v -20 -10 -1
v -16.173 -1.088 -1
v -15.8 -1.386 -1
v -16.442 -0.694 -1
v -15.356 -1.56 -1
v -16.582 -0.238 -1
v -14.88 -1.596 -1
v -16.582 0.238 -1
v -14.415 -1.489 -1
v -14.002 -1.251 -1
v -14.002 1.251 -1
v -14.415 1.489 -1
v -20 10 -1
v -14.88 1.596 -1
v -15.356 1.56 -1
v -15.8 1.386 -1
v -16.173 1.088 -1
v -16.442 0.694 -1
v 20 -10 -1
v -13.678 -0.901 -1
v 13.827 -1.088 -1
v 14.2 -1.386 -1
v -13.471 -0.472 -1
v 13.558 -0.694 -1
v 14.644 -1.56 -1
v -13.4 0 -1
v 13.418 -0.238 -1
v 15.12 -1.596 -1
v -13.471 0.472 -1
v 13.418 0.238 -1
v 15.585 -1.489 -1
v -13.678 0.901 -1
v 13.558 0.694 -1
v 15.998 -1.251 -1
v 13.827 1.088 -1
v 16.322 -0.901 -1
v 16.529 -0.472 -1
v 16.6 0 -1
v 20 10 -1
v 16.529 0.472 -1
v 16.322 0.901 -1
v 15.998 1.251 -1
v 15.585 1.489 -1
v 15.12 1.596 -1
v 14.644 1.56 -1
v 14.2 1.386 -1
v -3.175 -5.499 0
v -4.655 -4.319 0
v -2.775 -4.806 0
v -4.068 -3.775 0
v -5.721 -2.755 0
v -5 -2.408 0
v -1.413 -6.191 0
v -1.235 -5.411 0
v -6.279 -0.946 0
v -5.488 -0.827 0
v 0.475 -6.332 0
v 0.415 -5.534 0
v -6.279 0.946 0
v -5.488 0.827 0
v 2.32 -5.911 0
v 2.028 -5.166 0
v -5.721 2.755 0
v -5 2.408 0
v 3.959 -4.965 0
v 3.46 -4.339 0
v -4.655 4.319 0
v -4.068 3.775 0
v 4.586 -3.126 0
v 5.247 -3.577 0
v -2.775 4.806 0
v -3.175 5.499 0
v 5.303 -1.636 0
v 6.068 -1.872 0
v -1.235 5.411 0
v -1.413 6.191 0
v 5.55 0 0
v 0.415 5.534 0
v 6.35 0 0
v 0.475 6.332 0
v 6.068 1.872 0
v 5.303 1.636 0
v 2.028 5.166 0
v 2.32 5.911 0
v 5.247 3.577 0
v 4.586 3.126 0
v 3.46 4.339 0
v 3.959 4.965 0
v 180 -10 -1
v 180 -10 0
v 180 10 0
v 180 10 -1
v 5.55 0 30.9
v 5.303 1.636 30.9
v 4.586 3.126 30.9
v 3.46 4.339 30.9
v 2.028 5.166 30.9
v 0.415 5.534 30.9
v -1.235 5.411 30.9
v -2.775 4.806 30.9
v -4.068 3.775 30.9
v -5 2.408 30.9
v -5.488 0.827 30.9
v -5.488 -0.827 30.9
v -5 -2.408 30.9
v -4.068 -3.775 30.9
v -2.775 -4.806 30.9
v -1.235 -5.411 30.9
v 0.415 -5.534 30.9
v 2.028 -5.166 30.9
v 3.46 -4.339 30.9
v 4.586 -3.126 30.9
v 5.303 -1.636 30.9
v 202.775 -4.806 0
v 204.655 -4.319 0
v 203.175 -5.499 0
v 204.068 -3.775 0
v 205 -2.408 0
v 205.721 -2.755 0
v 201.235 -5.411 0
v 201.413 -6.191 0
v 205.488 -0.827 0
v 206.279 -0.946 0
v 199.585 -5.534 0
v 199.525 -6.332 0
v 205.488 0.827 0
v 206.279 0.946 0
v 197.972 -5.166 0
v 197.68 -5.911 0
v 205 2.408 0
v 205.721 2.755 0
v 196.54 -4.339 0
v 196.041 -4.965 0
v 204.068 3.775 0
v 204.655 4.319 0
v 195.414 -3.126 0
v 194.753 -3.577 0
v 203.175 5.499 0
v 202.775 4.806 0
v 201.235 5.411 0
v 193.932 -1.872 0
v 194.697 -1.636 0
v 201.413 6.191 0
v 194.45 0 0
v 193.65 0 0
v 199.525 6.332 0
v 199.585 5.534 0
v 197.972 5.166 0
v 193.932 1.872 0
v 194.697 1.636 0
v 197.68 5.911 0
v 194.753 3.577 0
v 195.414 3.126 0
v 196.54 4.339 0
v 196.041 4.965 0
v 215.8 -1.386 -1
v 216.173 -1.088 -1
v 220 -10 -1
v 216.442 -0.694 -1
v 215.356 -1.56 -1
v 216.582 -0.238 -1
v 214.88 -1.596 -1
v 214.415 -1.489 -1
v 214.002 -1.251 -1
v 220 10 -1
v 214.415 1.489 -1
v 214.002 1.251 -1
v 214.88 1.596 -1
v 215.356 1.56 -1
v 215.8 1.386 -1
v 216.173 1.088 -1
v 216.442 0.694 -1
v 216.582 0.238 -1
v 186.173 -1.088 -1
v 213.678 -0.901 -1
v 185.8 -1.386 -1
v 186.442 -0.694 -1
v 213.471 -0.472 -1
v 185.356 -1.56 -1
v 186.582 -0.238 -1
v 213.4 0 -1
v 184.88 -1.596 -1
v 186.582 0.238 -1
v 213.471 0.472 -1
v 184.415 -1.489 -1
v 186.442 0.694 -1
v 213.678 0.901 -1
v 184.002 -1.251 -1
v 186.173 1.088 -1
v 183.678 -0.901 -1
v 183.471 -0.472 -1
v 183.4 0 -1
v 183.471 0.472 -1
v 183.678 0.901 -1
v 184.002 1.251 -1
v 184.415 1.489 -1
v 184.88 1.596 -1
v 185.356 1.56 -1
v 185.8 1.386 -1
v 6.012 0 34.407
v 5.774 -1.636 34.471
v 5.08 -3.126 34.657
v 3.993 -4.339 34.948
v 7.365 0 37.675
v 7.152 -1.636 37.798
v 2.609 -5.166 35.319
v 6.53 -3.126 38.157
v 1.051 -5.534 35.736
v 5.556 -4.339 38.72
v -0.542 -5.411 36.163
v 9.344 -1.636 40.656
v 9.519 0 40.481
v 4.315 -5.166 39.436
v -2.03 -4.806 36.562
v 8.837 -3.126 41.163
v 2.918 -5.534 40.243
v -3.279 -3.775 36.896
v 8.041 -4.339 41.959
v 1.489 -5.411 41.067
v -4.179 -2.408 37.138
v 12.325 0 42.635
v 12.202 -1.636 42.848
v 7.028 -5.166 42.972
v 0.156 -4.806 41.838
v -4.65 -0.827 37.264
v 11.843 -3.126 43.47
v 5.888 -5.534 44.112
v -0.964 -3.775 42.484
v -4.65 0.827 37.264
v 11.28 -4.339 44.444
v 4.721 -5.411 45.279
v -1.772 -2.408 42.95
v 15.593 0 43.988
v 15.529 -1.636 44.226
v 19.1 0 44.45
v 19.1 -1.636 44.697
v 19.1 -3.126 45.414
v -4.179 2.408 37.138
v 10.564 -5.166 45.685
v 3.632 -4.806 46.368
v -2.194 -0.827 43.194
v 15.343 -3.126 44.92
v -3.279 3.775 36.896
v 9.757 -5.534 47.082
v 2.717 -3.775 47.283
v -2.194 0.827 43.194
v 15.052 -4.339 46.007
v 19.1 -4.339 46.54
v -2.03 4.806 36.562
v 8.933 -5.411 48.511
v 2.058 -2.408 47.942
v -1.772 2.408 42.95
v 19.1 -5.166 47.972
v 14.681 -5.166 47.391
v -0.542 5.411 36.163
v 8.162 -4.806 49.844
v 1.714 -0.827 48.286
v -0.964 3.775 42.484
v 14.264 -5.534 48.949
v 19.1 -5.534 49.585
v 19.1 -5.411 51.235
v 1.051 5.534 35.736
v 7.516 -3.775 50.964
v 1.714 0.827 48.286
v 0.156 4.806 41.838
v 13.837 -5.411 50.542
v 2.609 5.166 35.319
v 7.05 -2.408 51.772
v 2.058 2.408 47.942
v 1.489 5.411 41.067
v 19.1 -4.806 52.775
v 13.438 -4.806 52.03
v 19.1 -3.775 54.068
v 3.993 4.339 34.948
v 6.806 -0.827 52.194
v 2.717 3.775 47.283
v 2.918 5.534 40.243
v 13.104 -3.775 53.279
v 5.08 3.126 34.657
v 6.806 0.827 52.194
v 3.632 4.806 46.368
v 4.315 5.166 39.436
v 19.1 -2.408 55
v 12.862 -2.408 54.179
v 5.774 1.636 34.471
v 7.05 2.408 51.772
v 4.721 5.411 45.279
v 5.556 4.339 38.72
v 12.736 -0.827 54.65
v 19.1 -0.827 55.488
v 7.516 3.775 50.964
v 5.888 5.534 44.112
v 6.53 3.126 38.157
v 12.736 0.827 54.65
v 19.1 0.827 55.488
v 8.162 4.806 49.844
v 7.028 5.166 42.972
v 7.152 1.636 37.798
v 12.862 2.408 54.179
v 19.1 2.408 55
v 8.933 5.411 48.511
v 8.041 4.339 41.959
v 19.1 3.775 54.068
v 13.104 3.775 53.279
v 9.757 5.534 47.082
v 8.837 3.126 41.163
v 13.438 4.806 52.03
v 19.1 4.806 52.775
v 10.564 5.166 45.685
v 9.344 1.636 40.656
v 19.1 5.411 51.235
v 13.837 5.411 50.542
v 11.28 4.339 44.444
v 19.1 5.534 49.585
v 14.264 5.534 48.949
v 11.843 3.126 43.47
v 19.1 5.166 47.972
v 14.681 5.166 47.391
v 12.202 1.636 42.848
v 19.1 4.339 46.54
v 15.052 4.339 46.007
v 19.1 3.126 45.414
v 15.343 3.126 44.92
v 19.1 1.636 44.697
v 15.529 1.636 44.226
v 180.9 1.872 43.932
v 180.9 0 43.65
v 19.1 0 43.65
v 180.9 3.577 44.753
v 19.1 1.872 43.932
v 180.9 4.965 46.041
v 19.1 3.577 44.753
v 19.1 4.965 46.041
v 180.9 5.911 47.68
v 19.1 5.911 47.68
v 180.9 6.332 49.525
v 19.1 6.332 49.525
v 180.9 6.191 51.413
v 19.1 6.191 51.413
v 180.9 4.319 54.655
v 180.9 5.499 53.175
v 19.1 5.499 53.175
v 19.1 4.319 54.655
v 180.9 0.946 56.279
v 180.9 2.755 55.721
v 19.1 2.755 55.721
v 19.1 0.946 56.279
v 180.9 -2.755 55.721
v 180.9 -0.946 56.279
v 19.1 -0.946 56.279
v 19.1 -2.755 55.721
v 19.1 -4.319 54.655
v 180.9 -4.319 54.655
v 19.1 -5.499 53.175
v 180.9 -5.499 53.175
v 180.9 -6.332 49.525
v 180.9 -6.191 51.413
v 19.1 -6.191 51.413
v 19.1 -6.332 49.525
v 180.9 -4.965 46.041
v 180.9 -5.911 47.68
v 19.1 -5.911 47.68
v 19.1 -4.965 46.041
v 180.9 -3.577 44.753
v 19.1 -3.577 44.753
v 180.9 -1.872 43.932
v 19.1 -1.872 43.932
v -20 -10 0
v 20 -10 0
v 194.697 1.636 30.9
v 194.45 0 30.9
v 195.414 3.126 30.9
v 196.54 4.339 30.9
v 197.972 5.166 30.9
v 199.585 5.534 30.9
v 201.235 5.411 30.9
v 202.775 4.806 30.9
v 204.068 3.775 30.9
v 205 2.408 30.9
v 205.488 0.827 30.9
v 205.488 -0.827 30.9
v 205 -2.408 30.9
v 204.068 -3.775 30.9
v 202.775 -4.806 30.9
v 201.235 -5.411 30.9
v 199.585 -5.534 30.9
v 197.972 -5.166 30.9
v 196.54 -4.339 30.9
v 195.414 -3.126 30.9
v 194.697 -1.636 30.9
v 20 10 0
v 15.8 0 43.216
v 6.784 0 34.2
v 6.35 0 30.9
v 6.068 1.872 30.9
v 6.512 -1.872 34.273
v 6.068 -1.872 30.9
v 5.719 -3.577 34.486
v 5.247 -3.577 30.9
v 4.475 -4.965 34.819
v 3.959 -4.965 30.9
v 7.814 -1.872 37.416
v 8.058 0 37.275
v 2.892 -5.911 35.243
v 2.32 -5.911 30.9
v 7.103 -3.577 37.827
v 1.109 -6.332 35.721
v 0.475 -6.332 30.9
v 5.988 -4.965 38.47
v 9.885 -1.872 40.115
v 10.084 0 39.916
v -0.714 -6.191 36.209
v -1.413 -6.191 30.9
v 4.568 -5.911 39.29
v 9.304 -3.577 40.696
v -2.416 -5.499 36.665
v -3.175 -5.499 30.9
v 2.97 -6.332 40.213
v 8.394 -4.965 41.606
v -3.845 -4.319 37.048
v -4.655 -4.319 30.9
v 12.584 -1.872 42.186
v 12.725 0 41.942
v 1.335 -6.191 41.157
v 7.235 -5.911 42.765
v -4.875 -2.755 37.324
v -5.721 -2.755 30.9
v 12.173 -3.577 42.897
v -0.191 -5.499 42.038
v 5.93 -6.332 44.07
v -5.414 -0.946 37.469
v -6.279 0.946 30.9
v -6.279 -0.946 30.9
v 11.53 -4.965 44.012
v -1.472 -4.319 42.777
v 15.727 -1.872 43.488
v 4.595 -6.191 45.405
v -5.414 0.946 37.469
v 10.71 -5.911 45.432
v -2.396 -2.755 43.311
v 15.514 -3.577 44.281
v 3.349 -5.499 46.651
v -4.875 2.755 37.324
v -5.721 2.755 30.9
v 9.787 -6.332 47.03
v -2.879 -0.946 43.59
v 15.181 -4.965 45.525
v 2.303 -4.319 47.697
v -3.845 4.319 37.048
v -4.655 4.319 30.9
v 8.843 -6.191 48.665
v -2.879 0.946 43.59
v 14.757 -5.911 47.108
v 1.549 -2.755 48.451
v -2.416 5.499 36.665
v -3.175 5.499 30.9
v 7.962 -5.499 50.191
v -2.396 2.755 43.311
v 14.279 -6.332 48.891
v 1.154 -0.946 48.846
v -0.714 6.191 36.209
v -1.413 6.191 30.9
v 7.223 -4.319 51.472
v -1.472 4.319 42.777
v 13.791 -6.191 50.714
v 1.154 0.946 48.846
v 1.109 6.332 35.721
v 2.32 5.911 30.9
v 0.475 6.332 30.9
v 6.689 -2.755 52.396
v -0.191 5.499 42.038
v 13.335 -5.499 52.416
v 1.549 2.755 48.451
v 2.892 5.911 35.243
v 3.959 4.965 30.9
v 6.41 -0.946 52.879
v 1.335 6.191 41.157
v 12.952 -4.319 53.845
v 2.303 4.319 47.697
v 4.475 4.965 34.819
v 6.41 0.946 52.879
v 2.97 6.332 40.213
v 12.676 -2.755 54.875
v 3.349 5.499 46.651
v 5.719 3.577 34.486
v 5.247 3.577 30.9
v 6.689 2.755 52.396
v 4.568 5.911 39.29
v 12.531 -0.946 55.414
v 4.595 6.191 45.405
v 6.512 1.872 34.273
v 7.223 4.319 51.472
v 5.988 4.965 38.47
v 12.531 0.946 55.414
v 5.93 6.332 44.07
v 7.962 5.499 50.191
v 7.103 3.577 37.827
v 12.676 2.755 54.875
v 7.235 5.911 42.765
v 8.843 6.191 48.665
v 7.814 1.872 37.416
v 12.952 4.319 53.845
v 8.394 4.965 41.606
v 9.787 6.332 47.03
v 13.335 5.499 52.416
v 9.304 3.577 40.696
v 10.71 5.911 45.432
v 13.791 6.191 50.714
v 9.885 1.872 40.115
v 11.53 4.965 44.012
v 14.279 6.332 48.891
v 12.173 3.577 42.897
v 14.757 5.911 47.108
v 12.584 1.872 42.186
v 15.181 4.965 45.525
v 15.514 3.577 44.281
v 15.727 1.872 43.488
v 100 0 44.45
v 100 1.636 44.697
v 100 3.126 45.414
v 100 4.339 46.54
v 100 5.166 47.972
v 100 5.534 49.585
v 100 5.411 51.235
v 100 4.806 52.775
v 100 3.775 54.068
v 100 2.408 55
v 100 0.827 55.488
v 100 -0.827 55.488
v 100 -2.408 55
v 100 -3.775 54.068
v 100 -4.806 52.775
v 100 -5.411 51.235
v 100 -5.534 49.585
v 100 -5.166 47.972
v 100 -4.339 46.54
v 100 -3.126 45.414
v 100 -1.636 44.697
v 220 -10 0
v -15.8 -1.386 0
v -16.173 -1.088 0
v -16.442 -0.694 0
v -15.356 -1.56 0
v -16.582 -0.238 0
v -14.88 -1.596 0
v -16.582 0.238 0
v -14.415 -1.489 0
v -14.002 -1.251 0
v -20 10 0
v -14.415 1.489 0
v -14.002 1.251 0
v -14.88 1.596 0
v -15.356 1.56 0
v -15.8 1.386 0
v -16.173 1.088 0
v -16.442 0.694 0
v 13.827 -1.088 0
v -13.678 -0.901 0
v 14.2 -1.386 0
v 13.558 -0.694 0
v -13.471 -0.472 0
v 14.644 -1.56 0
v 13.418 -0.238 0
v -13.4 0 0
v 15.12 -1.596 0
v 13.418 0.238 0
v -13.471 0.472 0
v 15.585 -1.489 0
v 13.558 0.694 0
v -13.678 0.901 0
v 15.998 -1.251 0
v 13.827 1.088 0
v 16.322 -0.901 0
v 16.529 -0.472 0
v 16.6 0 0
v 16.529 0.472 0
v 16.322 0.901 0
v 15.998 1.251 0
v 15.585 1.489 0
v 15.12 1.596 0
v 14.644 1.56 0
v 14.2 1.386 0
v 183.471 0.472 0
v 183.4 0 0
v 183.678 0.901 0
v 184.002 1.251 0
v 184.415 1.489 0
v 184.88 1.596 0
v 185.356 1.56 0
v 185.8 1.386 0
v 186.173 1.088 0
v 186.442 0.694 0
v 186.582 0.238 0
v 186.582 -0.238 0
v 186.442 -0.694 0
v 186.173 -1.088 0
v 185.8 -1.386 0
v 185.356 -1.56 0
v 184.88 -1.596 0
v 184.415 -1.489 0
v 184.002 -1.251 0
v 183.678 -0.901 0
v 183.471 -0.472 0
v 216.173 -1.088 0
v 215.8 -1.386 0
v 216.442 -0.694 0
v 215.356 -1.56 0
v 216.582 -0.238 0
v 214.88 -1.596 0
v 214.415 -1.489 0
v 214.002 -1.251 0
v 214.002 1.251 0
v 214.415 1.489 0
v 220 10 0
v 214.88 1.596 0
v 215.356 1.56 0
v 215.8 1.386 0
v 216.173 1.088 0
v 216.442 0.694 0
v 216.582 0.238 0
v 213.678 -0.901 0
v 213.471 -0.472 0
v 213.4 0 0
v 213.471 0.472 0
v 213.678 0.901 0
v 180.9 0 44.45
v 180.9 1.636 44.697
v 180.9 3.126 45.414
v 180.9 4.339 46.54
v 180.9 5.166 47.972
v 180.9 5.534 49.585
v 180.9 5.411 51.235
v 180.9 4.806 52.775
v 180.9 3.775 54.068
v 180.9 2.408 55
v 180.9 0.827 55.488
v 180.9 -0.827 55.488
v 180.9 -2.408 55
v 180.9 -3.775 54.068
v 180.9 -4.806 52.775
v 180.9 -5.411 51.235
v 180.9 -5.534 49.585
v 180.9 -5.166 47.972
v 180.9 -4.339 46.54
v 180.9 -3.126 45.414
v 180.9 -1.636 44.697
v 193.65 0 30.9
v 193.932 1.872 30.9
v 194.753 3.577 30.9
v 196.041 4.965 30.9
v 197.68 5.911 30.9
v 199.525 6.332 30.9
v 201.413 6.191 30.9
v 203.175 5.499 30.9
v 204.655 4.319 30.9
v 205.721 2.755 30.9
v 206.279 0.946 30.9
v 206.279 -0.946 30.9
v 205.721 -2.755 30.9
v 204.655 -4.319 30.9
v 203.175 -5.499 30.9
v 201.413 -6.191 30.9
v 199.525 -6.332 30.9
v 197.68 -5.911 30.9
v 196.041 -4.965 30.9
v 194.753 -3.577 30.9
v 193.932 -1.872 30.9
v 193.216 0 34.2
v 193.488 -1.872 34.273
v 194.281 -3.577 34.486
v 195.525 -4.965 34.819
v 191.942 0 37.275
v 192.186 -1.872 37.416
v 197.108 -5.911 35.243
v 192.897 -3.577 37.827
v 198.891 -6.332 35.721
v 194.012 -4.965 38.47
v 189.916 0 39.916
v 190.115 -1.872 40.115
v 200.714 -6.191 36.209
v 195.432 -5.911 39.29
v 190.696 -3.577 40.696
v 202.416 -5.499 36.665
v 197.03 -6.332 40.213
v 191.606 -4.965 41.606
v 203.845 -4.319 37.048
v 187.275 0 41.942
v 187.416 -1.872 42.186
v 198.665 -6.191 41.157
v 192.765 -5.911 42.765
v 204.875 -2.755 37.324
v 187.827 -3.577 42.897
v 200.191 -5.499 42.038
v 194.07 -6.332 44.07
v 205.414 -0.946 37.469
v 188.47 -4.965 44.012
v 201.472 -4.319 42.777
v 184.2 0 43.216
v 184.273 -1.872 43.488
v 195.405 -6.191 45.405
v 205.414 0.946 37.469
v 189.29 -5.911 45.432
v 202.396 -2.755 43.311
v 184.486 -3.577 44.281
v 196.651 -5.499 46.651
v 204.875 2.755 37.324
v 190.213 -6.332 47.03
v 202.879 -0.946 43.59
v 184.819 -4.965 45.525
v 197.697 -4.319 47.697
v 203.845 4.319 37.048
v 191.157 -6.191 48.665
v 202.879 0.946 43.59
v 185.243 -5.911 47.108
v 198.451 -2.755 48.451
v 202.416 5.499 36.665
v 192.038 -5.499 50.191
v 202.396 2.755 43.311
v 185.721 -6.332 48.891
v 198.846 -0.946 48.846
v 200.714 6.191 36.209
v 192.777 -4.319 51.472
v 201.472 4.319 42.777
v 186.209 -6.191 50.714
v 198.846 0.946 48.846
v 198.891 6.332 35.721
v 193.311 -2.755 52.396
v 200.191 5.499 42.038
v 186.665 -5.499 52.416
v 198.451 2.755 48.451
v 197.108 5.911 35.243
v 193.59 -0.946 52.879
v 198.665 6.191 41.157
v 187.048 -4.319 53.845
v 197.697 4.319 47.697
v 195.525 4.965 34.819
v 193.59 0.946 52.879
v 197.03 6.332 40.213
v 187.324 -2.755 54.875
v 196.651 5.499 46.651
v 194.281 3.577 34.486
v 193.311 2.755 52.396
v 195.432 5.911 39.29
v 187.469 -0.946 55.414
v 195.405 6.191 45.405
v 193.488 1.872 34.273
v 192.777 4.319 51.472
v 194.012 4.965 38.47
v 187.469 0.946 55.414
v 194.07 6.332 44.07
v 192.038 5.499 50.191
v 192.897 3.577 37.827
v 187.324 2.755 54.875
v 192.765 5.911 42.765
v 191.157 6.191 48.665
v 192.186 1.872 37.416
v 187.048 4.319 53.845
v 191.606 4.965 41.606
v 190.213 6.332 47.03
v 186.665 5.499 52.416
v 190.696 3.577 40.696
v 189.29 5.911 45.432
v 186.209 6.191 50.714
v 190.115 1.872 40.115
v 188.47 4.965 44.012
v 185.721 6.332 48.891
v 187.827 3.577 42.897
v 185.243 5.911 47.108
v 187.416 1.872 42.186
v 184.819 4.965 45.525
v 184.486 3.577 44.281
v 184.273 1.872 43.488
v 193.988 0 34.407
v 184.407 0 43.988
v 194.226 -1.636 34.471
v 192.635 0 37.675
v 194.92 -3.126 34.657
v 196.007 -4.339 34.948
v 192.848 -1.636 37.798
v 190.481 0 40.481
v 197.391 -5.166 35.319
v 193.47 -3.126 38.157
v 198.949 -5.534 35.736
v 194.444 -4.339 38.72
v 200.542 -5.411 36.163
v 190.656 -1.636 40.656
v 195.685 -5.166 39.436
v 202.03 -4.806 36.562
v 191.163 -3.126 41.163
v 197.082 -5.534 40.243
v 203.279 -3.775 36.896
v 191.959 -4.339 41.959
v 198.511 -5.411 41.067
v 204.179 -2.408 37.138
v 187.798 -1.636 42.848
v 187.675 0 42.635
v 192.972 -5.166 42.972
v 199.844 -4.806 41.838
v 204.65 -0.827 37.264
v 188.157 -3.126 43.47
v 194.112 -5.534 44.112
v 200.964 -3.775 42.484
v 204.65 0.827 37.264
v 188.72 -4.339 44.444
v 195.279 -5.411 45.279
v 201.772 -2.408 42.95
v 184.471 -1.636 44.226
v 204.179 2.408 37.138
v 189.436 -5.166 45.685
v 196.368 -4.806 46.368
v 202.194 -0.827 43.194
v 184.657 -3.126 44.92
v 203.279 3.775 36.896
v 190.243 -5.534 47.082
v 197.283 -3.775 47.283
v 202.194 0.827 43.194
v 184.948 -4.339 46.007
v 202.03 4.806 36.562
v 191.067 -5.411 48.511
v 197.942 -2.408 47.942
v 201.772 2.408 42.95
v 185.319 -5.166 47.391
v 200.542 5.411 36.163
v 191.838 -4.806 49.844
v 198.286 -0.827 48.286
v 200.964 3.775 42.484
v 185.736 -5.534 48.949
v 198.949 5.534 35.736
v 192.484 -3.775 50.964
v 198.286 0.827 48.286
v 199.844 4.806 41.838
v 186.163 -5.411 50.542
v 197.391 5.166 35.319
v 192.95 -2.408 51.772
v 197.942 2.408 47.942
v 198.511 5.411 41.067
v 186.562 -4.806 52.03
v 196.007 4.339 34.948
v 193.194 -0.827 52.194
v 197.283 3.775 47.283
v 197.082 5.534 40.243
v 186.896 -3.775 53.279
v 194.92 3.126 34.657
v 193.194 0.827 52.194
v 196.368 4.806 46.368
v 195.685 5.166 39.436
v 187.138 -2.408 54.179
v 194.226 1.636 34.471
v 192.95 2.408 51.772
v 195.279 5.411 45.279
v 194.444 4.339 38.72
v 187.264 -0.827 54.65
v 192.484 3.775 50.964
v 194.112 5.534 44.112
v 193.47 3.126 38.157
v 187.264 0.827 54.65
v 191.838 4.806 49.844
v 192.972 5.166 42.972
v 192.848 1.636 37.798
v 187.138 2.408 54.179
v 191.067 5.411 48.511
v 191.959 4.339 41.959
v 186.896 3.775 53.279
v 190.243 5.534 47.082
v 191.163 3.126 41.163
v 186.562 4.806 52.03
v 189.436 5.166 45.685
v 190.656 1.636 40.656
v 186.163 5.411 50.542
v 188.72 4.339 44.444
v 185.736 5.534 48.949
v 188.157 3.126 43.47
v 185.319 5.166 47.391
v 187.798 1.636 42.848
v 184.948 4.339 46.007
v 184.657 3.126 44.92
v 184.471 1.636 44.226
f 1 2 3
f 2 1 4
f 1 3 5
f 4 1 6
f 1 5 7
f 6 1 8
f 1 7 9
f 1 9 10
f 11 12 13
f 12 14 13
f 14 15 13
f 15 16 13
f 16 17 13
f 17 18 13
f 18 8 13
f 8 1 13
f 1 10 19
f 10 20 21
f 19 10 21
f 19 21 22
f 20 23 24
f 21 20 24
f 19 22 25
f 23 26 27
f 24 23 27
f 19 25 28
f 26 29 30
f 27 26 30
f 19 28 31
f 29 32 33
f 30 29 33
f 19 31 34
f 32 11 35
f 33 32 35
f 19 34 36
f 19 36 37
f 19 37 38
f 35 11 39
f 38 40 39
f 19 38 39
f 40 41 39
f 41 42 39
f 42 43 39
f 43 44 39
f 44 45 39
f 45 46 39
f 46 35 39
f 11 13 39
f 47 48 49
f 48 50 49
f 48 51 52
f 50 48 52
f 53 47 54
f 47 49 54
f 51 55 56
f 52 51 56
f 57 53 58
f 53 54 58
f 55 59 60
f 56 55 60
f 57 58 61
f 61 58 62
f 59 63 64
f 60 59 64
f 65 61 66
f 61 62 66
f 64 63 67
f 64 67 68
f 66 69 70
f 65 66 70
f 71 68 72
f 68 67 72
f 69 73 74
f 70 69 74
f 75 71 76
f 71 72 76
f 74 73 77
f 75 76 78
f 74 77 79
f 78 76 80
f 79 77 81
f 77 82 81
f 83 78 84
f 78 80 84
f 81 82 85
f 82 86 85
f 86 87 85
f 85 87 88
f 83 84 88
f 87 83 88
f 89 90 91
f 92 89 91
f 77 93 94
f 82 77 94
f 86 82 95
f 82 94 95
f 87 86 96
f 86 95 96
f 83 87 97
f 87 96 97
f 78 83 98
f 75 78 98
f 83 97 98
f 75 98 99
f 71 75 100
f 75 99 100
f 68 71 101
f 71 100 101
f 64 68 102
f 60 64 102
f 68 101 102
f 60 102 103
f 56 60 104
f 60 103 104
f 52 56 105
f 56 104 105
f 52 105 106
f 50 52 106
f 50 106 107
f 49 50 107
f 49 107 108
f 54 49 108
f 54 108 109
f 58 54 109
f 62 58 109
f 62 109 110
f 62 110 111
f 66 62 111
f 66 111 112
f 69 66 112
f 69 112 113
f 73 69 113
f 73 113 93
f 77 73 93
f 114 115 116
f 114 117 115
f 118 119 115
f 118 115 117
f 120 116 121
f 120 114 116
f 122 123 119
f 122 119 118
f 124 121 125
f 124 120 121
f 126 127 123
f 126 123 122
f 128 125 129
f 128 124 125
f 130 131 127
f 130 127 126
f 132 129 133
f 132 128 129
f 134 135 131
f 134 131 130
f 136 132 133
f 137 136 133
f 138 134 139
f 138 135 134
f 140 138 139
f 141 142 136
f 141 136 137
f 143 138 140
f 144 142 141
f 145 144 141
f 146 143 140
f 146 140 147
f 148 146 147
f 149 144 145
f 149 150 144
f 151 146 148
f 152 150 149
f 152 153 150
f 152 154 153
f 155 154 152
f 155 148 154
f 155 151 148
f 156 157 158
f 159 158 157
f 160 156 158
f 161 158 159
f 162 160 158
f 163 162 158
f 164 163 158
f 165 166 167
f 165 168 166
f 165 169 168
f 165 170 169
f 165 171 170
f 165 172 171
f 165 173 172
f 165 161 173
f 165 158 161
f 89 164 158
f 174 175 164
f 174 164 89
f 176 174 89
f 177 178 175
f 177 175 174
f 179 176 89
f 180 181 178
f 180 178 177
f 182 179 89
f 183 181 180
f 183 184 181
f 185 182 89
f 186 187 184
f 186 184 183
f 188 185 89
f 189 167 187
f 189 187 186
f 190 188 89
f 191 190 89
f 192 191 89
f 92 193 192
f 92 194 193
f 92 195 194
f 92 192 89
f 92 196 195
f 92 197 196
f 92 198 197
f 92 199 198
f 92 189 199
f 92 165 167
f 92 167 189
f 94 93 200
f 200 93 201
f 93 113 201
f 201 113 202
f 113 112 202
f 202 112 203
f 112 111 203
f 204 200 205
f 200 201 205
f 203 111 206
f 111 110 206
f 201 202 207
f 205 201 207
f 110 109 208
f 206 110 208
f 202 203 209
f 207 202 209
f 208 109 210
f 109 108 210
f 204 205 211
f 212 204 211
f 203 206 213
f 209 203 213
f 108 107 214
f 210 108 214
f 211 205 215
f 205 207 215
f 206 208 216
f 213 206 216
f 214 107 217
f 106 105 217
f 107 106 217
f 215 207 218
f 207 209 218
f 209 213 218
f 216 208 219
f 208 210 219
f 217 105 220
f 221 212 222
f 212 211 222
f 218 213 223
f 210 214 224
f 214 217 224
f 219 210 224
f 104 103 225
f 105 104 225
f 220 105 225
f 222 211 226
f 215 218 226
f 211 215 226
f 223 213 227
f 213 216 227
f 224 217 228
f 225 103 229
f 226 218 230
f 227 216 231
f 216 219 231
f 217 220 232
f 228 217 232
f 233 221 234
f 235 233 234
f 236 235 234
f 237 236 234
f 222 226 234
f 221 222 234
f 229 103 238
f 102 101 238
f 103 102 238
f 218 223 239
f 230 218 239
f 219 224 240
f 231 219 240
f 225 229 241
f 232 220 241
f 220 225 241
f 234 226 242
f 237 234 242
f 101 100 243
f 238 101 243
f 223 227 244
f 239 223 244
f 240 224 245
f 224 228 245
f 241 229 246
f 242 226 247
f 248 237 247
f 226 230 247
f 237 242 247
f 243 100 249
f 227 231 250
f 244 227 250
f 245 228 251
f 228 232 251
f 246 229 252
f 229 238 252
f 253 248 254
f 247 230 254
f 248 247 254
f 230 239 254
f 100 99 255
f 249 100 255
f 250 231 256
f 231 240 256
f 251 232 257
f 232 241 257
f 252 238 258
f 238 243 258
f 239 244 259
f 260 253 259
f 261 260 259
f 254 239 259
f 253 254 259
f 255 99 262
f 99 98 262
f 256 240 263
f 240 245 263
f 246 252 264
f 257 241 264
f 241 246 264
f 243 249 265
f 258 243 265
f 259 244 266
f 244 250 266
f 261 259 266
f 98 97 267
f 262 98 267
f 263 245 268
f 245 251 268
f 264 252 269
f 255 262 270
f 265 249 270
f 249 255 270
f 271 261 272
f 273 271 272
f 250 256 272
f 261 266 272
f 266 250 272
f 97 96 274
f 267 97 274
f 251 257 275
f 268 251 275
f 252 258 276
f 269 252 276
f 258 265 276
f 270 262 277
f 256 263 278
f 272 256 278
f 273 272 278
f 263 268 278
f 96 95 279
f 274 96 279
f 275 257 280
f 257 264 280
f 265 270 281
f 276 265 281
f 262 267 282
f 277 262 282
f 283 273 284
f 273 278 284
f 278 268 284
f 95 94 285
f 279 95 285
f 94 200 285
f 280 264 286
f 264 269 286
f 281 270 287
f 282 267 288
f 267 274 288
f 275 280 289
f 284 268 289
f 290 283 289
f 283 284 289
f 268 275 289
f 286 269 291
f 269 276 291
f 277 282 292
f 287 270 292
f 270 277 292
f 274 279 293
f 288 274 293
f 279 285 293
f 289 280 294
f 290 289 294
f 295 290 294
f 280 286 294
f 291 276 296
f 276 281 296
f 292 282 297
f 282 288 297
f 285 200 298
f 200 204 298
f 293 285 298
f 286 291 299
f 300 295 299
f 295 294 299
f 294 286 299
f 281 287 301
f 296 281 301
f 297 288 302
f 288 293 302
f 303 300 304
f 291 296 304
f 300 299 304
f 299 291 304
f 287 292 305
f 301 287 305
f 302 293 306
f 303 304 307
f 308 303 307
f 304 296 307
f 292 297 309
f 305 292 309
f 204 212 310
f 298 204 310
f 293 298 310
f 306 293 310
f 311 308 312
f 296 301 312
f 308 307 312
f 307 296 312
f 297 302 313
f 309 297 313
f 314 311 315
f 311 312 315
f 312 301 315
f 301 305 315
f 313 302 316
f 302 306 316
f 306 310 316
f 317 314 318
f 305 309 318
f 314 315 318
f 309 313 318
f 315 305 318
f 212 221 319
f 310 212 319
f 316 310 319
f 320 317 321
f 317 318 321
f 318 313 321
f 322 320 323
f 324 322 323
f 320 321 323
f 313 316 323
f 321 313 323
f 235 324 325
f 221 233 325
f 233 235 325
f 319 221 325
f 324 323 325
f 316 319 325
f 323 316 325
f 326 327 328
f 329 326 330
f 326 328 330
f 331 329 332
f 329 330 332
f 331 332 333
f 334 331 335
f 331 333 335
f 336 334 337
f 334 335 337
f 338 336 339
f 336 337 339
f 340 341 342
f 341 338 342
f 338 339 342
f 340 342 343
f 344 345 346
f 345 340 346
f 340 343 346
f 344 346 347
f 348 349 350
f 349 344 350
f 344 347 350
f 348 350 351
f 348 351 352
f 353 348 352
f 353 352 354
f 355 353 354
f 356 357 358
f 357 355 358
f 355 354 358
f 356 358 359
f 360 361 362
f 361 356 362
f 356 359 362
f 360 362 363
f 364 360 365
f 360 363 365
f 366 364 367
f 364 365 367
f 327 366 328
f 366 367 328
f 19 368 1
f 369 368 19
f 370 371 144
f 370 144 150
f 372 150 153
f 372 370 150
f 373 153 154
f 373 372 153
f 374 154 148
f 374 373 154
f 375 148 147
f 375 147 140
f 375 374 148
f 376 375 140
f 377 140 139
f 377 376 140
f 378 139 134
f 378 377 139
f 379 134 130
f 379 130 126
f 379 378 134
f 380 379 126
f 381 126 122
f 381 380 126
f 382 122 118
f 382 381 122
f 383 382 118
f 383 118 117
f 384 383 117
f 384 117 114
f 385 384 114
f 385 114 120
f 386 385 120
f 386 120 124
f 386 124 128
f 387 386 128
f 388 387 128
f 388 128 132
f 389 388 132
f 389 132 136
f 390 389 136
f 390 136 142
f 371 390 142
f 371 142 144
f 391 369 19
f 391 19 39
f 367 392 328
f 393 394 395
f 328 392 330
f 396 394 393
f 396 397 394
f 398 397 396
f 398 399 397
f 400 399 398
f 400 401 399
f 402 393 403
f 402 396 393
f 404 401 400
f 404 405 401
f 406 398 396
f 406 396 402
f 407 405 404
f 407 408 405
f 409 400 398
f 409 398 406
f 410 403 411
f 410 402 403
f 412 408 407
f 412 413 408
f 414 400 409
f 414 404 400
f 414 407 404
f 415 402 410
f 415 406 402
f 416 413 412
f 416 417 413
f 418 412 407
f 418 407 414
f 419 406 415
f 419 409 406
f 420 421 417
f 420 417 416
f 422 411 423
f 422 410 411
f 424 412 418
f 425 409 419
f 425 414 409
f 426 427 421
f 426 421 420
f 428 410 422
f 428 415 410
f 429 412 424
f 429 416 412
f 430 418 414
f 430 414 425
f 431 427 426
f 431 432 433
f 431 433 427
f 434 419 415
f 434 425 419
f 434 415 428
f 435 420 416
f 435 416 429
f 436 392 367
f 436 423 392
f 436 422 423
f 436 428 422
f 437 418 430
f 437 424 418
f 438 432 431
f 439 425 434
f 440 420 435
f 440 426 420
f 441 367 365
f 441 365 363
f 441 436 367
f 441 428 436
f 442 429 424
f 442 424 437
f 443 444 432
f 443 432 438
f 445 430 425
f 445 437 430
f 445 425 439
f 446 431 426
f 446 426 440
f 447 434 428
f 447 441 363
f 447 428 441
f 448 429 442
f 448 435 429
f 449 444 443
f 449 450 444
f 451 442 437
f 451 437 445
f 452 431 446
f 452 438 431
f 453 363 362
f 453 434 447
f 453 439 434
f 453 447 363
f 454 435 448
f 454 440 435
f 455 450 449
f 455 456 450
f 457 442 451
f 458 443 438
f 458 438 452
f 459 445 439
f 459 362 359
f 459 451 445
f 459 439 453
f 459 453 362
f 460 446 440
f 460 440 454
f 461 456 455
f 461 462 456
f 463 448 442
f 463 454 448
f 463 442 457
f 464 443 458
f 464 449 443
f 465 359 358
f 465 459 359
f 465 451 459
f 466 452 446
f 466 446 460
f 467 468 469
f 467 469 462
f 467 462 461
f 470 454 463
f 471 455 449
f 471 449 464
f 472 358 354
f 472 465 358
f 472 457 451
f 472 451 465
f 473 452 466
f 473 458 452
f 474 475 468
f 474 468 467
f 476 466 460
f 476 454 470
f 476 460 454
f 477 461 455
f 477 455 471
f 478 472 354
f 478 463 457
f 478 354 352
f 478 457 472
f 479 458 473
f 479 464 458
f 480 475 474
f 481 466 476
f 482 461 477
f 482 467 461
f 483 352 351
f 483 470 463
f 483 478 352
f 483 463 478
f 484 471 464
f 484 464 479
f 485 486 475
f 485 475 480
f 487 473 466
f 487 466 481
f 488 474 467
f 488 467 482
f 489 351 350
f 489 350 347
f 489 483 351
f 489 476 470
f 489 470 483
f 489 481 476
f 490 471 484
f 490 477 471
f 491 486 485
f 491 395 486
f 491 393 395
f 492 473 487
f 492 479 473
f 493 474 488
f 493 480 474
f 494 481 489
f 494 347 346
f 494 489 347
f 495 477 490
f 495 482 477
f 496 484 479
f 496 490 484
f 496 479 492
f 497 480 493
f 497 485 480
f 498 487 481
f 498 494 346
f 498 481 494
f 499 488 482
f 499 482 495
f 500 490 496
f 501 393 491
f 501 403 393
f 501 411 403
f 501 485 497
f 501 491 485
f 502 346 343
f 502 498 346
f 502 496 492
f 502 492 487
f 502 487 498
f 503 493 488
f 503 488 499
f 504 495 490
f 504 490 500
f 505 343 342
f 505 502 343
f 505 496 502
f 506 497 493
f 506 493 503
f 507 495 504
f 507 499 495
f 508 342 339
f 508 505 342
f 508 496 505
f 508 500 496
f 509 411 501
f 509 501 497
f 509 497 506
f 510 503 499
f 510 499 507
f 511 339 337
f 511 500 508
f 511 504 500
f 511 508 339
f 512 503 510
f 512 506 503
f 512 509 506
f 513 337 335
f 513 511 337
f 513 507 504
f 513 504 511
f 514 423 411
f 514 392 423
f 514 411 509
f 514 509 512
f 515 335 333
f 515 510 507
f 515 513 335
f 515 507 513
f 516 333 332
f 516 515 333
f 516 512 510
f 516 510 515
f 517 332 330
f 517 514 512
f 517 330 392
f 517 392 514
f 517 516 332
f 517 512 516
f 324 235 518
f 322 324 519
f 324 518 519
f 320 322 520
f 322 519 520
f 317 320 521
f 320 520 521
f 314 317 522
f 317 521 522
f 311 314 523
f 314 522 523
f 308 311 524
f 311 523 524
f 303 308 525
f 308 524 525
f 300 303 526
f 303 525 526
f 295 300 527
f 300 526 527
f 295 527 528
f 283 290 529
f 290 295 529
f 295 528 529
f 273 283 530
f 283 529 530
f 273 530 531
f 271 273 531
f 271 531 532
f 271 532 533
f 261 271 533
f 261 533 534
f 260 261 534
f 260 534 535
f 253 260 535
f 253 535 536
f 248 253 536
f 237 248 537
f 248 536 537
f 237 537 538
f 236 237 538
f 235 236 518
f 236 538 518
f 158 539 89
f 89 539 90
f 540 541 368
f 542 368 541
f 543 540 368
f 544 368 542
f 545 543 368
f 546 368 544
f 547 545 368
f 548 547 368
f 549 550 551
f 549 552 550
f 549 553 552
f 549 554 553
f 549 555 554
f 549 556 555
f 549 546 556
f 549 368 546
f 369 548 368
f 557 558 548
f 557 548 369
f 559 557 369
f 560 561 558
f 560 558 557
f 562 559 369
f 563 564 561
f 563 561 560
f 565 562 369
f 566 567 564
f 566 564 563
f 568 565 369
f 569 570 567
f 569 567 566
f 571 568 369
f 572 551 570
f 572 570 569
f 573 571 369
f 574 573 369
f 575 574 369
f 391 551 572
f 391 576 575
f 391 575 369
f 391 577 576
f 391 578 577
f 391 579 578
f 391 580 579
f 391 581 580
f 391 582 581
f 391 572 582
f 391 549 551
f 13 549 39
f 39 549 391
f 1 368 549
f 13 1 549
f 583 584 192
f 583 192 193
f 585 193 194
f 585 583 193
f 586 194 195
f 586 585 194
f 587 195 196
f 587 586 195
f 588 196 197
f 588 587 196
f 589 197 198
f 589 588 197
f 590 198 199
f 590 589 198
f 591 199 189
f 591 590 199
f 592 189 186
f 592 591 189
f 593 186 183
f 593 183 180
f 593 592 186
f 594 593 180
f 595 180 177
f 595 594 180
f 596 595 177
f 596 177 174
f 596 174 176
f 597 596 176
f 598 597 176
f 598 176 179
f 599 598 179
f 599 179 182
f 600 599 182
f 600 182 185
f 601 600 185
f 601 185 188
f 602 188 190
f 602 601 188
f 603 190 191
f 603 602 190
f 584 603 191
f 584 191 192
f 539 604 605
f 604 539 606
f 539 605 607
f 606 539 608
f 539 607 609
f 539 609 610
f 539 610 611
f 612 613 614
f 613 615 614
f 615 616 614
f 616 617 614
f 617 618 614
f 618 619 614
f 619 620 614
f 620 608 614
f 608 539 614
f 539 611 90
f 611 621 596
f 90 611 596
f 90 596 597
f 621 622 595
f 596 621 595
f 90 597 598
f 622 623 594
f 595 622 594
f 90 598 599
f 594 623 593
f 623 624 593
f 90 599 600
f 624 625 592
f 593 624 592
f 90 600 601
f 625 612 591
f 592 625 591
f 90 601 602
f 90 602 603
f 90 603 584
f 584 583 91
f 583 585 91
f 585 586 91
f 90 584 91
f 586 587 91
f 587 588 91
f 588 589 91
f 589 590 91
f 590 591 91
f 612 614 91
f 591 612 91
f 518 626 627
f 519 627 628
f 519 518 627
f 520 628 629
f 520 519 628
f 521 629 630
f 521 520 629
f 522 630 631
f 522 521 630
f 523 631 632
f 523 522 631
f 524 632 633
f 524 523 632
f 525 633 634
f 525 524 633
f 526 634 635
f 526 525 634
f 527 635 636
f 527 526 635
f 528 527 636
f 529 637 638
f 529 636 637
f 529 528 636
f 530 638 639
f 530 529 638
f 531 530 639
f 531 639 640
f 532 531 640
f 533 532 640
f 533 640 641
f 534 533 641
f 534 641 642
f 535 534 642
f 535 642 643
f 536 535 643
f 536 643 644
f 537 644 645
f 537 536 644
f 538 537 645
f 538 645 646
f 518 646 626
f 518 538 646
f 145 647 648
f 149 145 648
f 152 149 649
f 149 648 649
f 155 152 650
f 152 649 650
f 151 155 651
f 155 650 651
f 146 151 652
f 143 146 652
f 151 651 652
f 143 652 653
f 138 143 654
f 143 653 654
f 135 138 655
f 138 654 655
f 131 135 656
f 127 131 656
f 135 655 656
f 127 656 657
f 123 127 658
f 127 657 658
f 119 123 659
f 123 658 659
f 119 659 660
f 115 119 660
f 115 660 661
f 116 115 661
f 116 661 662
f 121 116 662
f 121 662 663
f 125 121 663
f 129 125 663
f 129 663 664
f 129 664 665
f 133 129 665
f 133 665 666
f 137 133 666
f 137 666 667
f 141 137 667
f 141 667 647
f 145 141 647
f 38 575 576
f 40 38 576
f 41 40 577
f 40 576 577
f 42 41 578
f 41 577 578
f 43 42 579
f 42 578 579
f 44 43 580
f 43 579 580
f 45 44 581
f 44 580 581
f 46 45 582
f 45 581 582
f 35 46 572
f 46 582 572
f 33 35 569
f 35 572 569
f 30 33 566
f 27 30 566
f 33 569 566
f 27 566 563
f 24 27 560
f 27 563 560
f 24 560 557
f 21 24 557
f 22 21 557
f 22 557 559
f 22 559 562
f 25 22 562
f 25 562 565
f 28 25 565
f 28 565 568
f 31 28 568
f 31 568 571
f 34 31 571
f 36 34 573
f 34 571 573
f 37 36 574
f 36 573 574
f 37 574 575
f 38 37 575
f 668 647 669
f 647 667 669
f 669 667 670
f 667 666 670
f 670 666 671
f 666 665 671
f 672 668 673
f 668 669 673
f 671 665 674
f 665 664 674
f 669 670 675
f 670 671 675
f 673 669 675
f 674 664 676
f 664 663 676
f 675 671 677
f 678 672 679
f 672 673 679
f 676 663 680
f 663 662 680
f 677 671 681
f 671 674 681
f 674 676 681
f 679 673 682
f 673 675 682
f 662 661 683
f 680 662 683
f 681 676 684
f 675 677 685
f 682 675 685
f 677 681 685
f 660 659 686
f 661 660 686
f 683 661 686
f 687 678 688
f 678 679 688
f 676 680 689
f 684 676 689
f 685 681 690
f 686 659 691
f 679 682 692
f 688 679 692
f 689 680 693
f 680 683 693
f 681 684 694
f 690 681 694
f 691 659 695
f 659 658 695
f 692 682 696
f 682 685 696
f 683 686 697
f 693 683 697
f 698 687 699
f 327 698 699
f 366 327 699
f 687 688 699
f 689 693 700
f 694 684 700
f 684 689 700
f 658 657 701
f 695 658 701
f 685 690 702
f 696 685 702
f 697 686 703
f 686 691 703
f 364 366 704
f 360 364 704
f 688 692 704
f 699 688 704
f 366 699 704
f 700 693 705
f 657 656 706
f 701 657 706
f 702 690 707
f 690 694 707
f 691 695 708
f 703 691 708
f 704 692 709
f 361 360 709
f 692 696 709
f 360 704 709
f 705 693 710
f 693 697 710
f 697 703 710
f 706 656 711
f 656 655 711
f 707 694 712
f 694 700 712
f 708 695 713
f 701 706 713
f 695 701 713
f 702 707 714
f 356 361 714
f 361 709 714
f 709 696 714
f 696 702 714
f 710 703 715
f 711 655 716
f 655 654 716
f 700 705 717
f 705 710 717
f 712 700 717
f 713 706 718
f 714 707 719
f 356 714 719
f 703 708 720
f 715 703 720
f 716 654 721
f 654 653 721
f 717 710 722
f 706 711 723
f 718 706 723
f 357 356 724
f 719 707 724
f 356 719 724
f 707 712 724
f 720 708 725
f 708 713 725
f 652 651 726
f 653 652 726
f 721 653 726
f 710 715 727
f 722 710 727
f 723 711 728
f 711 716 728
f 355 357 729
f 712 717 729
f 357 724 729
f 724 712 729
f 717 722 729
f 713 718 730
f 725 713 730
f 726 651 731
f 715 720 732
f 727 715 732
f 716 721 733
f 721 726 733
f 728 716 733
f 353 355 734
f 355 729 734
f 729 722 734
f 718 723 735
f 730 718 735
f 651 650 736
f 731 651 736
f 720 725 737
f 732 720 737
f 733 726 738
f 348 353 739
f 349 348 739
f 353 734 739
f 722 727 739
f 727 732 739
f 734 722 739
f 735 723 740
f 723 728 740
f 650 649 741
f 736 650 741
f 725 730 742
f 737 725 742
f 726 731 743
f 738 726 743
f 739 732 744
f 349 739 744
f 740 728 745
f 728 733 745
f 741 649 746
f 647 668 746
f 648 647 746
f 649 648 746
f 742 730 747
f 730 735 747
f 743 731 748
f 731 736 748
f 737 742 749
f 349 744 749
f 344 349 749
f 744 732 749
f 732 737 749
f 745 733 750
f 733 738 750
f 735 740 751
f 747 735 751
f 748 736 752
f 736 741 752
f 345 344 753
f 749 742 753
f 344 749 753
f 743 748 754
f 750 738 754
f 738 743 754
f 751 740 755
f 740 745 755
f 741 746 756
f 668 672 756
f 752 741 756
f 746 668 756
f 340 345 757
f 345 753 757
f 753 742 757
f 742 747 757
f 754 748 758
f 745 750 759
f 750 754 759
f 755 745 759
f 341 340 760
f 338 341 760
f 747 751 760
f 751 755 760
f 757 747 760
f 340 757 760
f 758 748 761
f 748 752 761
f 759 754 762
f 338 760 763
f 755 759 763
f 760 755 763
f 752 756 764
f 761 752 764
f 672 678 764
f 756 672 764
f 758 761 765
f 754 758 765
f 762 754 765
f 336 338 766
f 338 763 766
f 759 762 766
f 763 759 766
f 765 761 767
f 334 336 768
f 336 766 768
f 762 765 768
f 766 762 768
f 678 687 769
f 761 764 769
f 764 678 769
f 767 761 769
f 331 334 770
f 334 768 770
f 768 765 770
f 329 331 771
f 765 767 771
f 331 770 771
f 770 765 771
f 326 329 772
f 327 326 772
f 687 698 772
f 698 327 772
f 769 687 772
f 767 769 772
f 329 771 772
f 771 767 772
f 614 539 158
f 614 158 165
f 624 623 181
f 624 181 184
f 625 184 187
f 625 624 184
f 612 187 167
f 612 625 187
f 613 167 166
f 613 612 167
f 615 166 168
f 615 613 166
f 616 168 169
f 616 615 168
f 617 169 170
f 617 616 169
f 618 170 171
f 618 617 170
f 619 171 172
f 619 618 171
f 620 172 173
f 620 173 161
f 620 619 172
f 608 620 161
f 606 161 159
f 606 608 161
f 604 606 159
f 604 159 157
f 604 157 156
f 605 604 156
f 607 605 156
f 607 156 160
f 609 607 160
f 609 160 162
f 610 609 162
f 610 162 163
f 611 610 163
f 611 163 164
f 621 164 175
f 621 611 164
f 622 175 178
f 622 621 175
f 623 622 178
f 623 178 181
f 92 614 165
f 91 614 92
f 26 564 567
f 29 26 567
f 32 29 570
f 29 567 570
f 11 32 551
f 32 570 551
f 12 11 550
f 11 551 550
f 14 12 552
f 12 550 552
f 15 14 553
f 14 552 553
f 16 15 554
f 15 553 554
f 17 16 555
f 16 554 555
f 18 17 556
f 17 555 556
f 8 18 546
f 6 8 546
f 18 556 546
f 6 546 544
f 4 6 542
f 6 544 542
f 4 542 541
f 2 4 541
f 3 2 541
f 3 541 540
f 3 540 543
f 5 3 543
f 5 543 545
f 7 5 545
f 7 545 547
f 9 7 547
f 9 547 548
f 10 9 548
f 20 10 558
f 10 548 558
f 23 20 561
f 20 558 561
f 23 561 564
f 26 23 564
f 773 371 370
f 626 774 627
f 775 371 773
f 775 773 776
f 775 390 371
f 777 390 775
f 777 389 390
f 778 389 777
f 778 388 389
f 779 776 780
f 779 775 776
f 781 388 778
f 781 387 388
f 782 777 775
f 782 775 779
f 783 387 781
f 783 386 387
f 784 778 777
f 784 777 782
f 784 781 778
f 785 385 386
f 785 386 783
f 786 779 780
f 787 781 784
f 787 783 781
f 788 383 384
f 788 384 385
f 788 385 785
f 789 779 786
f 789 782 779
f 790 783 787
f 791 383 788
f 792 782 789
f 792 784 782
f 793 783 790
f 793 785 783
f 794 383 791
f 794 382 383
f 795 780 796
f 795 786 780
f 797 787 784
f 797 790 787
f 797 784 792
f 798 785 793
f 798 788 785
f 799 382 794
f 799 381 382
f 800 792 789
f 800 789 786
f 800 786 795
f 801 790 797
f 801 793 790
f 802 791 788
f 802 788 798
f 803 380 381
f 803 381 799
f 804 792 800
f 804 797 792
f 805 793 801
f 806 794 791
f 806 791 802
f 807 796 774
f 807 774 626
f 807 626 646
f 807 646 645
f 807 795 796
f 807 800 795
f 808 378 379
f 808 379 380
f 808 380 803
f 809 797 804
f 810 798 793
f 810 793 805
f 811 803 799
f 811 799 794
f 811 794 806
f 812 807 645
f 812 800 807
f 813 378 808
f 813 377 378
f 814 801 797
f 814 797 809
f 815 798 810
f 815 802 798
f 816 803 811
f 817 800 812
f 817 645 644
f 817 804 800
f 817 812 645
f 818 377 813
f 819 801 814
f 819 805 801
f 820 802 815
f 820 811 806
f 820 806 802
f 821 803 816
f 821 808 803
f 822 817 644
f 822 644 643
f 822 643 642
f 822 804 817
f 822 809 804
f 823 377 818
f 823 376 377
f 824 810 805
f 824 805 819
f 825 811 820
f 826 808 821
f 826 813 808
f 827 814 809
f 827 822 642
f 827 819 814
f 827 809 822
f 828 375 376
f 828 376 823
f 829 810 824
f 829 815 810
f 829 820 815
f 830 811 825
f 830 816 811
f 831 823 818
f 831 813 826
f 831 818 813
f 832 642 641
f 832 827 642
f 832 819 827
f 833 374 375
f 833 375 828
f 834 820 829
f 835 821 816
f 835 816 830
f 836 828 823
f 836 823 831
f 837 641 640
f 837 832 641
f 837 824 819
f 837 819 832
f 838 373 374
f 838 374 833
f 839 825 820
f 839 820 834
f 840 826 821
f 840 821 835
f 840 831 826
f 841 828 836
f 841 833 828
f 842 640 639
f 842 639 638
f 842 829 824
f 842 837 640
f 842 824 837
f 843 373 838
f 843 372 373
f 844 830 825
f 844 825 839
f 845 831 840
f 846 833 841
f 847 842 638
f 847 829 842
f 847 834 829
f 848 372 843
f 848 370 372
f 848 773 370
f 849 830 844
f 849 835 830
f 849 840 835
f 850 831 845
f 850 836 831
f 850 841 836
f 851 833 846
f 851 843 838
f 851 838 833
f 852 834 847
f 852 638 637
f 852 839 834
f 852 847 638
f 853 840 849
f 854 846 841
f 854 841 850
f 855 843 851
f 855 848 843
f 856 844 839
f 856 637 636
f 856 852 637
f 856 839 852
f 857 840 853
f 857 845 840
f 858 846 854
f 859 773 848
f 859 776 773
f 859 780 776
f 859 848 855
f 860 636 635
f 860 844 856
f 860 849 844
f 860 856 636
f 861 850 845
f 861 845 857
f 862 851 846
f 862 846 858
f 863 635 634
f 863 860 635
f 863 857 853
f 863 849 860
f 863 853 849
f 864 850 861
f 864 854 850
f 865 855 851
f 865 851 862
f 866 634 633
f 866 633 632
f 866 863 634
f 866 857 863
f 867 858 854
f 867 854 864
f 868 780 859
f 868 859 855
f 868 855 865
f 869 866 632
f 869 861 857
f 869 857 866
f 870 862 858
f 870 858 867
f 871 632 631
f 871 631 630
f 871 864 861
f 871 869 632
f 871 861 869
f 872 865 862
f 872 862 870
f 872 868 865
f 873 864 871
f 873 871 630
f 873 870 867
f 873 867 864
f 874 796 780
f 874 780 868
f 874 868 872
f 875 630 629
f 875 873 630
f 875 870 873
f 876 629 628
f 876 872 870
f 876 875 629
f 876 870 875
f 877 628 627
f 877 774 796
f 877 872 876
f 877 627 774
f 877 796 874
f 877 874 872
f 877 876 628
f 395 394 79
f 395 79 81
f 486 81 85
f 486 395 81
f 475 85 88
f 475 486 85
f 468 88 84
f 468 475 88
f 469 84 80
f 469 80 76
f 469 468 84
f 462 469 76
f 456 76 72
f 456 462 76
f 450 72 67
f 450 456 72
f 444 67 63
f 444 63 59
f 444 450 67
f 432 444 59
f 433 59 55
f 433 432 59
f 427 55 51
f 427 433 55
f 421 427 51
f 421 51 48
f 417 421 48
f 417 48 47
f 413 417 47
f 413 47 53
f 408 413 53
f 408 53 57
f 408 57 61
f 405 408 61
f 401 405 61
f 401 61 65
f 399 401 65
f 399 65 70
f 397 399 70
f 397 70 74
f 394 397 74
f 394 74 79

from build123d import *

# Parameters (mm, degrees)
F0_R     = 6.35
F0_R_2   = 5.55
F4_W     = 40
F4_H     = 20
F4_R     = 1.6
F5_DEPTH = 1


with BuildPart() as f2:
    # F2: sweep along a path in F1
    with BuildLine(Plane.XZ) as f2_path:
        Line((0, 0), (0, 30.9))
        ThreePointArc((0, 30.9), (5.5942604793, 44.4057395207), (19.1, 50))
        Line((19.1, 50), (100, 50))
    # F0 (on Top) → F2 (sweep)
    with BuildSketch(Plane.XY):
        Circle(F0_R)
        Circle(F0_R_2, mode=Mode.SUBTRACT)
    sweep(path=f2_path.line)

    # F6: F2 across plane


with BuildPart() as f5:
    # F4 (on Top) → F5 (new body)
    with BuildSketch(Plane.XY):
        Rectangle(F4_W, F4_H)
        with Locations((-15, 0)):
            Circle(F4_R, mode=Mode.SUBTRACT)
        with Locations((15, 0)):
            Circle(F4_R, mode=Mode.SUBTRACT)
    extrude(amount=-F5_DEPTH)


with BuildPart() as f2_1:
    add(f2.part)
    add(f2.part.mirror(Plane.YZ.offset(100)))


with BuildPart() as f7_1:
    # F7: instance of F5
    add(f5.part.mirror(Plane.YZ.offset(100)))


solid = Compound([f5.part, f2_1.part, f7_1.part])
